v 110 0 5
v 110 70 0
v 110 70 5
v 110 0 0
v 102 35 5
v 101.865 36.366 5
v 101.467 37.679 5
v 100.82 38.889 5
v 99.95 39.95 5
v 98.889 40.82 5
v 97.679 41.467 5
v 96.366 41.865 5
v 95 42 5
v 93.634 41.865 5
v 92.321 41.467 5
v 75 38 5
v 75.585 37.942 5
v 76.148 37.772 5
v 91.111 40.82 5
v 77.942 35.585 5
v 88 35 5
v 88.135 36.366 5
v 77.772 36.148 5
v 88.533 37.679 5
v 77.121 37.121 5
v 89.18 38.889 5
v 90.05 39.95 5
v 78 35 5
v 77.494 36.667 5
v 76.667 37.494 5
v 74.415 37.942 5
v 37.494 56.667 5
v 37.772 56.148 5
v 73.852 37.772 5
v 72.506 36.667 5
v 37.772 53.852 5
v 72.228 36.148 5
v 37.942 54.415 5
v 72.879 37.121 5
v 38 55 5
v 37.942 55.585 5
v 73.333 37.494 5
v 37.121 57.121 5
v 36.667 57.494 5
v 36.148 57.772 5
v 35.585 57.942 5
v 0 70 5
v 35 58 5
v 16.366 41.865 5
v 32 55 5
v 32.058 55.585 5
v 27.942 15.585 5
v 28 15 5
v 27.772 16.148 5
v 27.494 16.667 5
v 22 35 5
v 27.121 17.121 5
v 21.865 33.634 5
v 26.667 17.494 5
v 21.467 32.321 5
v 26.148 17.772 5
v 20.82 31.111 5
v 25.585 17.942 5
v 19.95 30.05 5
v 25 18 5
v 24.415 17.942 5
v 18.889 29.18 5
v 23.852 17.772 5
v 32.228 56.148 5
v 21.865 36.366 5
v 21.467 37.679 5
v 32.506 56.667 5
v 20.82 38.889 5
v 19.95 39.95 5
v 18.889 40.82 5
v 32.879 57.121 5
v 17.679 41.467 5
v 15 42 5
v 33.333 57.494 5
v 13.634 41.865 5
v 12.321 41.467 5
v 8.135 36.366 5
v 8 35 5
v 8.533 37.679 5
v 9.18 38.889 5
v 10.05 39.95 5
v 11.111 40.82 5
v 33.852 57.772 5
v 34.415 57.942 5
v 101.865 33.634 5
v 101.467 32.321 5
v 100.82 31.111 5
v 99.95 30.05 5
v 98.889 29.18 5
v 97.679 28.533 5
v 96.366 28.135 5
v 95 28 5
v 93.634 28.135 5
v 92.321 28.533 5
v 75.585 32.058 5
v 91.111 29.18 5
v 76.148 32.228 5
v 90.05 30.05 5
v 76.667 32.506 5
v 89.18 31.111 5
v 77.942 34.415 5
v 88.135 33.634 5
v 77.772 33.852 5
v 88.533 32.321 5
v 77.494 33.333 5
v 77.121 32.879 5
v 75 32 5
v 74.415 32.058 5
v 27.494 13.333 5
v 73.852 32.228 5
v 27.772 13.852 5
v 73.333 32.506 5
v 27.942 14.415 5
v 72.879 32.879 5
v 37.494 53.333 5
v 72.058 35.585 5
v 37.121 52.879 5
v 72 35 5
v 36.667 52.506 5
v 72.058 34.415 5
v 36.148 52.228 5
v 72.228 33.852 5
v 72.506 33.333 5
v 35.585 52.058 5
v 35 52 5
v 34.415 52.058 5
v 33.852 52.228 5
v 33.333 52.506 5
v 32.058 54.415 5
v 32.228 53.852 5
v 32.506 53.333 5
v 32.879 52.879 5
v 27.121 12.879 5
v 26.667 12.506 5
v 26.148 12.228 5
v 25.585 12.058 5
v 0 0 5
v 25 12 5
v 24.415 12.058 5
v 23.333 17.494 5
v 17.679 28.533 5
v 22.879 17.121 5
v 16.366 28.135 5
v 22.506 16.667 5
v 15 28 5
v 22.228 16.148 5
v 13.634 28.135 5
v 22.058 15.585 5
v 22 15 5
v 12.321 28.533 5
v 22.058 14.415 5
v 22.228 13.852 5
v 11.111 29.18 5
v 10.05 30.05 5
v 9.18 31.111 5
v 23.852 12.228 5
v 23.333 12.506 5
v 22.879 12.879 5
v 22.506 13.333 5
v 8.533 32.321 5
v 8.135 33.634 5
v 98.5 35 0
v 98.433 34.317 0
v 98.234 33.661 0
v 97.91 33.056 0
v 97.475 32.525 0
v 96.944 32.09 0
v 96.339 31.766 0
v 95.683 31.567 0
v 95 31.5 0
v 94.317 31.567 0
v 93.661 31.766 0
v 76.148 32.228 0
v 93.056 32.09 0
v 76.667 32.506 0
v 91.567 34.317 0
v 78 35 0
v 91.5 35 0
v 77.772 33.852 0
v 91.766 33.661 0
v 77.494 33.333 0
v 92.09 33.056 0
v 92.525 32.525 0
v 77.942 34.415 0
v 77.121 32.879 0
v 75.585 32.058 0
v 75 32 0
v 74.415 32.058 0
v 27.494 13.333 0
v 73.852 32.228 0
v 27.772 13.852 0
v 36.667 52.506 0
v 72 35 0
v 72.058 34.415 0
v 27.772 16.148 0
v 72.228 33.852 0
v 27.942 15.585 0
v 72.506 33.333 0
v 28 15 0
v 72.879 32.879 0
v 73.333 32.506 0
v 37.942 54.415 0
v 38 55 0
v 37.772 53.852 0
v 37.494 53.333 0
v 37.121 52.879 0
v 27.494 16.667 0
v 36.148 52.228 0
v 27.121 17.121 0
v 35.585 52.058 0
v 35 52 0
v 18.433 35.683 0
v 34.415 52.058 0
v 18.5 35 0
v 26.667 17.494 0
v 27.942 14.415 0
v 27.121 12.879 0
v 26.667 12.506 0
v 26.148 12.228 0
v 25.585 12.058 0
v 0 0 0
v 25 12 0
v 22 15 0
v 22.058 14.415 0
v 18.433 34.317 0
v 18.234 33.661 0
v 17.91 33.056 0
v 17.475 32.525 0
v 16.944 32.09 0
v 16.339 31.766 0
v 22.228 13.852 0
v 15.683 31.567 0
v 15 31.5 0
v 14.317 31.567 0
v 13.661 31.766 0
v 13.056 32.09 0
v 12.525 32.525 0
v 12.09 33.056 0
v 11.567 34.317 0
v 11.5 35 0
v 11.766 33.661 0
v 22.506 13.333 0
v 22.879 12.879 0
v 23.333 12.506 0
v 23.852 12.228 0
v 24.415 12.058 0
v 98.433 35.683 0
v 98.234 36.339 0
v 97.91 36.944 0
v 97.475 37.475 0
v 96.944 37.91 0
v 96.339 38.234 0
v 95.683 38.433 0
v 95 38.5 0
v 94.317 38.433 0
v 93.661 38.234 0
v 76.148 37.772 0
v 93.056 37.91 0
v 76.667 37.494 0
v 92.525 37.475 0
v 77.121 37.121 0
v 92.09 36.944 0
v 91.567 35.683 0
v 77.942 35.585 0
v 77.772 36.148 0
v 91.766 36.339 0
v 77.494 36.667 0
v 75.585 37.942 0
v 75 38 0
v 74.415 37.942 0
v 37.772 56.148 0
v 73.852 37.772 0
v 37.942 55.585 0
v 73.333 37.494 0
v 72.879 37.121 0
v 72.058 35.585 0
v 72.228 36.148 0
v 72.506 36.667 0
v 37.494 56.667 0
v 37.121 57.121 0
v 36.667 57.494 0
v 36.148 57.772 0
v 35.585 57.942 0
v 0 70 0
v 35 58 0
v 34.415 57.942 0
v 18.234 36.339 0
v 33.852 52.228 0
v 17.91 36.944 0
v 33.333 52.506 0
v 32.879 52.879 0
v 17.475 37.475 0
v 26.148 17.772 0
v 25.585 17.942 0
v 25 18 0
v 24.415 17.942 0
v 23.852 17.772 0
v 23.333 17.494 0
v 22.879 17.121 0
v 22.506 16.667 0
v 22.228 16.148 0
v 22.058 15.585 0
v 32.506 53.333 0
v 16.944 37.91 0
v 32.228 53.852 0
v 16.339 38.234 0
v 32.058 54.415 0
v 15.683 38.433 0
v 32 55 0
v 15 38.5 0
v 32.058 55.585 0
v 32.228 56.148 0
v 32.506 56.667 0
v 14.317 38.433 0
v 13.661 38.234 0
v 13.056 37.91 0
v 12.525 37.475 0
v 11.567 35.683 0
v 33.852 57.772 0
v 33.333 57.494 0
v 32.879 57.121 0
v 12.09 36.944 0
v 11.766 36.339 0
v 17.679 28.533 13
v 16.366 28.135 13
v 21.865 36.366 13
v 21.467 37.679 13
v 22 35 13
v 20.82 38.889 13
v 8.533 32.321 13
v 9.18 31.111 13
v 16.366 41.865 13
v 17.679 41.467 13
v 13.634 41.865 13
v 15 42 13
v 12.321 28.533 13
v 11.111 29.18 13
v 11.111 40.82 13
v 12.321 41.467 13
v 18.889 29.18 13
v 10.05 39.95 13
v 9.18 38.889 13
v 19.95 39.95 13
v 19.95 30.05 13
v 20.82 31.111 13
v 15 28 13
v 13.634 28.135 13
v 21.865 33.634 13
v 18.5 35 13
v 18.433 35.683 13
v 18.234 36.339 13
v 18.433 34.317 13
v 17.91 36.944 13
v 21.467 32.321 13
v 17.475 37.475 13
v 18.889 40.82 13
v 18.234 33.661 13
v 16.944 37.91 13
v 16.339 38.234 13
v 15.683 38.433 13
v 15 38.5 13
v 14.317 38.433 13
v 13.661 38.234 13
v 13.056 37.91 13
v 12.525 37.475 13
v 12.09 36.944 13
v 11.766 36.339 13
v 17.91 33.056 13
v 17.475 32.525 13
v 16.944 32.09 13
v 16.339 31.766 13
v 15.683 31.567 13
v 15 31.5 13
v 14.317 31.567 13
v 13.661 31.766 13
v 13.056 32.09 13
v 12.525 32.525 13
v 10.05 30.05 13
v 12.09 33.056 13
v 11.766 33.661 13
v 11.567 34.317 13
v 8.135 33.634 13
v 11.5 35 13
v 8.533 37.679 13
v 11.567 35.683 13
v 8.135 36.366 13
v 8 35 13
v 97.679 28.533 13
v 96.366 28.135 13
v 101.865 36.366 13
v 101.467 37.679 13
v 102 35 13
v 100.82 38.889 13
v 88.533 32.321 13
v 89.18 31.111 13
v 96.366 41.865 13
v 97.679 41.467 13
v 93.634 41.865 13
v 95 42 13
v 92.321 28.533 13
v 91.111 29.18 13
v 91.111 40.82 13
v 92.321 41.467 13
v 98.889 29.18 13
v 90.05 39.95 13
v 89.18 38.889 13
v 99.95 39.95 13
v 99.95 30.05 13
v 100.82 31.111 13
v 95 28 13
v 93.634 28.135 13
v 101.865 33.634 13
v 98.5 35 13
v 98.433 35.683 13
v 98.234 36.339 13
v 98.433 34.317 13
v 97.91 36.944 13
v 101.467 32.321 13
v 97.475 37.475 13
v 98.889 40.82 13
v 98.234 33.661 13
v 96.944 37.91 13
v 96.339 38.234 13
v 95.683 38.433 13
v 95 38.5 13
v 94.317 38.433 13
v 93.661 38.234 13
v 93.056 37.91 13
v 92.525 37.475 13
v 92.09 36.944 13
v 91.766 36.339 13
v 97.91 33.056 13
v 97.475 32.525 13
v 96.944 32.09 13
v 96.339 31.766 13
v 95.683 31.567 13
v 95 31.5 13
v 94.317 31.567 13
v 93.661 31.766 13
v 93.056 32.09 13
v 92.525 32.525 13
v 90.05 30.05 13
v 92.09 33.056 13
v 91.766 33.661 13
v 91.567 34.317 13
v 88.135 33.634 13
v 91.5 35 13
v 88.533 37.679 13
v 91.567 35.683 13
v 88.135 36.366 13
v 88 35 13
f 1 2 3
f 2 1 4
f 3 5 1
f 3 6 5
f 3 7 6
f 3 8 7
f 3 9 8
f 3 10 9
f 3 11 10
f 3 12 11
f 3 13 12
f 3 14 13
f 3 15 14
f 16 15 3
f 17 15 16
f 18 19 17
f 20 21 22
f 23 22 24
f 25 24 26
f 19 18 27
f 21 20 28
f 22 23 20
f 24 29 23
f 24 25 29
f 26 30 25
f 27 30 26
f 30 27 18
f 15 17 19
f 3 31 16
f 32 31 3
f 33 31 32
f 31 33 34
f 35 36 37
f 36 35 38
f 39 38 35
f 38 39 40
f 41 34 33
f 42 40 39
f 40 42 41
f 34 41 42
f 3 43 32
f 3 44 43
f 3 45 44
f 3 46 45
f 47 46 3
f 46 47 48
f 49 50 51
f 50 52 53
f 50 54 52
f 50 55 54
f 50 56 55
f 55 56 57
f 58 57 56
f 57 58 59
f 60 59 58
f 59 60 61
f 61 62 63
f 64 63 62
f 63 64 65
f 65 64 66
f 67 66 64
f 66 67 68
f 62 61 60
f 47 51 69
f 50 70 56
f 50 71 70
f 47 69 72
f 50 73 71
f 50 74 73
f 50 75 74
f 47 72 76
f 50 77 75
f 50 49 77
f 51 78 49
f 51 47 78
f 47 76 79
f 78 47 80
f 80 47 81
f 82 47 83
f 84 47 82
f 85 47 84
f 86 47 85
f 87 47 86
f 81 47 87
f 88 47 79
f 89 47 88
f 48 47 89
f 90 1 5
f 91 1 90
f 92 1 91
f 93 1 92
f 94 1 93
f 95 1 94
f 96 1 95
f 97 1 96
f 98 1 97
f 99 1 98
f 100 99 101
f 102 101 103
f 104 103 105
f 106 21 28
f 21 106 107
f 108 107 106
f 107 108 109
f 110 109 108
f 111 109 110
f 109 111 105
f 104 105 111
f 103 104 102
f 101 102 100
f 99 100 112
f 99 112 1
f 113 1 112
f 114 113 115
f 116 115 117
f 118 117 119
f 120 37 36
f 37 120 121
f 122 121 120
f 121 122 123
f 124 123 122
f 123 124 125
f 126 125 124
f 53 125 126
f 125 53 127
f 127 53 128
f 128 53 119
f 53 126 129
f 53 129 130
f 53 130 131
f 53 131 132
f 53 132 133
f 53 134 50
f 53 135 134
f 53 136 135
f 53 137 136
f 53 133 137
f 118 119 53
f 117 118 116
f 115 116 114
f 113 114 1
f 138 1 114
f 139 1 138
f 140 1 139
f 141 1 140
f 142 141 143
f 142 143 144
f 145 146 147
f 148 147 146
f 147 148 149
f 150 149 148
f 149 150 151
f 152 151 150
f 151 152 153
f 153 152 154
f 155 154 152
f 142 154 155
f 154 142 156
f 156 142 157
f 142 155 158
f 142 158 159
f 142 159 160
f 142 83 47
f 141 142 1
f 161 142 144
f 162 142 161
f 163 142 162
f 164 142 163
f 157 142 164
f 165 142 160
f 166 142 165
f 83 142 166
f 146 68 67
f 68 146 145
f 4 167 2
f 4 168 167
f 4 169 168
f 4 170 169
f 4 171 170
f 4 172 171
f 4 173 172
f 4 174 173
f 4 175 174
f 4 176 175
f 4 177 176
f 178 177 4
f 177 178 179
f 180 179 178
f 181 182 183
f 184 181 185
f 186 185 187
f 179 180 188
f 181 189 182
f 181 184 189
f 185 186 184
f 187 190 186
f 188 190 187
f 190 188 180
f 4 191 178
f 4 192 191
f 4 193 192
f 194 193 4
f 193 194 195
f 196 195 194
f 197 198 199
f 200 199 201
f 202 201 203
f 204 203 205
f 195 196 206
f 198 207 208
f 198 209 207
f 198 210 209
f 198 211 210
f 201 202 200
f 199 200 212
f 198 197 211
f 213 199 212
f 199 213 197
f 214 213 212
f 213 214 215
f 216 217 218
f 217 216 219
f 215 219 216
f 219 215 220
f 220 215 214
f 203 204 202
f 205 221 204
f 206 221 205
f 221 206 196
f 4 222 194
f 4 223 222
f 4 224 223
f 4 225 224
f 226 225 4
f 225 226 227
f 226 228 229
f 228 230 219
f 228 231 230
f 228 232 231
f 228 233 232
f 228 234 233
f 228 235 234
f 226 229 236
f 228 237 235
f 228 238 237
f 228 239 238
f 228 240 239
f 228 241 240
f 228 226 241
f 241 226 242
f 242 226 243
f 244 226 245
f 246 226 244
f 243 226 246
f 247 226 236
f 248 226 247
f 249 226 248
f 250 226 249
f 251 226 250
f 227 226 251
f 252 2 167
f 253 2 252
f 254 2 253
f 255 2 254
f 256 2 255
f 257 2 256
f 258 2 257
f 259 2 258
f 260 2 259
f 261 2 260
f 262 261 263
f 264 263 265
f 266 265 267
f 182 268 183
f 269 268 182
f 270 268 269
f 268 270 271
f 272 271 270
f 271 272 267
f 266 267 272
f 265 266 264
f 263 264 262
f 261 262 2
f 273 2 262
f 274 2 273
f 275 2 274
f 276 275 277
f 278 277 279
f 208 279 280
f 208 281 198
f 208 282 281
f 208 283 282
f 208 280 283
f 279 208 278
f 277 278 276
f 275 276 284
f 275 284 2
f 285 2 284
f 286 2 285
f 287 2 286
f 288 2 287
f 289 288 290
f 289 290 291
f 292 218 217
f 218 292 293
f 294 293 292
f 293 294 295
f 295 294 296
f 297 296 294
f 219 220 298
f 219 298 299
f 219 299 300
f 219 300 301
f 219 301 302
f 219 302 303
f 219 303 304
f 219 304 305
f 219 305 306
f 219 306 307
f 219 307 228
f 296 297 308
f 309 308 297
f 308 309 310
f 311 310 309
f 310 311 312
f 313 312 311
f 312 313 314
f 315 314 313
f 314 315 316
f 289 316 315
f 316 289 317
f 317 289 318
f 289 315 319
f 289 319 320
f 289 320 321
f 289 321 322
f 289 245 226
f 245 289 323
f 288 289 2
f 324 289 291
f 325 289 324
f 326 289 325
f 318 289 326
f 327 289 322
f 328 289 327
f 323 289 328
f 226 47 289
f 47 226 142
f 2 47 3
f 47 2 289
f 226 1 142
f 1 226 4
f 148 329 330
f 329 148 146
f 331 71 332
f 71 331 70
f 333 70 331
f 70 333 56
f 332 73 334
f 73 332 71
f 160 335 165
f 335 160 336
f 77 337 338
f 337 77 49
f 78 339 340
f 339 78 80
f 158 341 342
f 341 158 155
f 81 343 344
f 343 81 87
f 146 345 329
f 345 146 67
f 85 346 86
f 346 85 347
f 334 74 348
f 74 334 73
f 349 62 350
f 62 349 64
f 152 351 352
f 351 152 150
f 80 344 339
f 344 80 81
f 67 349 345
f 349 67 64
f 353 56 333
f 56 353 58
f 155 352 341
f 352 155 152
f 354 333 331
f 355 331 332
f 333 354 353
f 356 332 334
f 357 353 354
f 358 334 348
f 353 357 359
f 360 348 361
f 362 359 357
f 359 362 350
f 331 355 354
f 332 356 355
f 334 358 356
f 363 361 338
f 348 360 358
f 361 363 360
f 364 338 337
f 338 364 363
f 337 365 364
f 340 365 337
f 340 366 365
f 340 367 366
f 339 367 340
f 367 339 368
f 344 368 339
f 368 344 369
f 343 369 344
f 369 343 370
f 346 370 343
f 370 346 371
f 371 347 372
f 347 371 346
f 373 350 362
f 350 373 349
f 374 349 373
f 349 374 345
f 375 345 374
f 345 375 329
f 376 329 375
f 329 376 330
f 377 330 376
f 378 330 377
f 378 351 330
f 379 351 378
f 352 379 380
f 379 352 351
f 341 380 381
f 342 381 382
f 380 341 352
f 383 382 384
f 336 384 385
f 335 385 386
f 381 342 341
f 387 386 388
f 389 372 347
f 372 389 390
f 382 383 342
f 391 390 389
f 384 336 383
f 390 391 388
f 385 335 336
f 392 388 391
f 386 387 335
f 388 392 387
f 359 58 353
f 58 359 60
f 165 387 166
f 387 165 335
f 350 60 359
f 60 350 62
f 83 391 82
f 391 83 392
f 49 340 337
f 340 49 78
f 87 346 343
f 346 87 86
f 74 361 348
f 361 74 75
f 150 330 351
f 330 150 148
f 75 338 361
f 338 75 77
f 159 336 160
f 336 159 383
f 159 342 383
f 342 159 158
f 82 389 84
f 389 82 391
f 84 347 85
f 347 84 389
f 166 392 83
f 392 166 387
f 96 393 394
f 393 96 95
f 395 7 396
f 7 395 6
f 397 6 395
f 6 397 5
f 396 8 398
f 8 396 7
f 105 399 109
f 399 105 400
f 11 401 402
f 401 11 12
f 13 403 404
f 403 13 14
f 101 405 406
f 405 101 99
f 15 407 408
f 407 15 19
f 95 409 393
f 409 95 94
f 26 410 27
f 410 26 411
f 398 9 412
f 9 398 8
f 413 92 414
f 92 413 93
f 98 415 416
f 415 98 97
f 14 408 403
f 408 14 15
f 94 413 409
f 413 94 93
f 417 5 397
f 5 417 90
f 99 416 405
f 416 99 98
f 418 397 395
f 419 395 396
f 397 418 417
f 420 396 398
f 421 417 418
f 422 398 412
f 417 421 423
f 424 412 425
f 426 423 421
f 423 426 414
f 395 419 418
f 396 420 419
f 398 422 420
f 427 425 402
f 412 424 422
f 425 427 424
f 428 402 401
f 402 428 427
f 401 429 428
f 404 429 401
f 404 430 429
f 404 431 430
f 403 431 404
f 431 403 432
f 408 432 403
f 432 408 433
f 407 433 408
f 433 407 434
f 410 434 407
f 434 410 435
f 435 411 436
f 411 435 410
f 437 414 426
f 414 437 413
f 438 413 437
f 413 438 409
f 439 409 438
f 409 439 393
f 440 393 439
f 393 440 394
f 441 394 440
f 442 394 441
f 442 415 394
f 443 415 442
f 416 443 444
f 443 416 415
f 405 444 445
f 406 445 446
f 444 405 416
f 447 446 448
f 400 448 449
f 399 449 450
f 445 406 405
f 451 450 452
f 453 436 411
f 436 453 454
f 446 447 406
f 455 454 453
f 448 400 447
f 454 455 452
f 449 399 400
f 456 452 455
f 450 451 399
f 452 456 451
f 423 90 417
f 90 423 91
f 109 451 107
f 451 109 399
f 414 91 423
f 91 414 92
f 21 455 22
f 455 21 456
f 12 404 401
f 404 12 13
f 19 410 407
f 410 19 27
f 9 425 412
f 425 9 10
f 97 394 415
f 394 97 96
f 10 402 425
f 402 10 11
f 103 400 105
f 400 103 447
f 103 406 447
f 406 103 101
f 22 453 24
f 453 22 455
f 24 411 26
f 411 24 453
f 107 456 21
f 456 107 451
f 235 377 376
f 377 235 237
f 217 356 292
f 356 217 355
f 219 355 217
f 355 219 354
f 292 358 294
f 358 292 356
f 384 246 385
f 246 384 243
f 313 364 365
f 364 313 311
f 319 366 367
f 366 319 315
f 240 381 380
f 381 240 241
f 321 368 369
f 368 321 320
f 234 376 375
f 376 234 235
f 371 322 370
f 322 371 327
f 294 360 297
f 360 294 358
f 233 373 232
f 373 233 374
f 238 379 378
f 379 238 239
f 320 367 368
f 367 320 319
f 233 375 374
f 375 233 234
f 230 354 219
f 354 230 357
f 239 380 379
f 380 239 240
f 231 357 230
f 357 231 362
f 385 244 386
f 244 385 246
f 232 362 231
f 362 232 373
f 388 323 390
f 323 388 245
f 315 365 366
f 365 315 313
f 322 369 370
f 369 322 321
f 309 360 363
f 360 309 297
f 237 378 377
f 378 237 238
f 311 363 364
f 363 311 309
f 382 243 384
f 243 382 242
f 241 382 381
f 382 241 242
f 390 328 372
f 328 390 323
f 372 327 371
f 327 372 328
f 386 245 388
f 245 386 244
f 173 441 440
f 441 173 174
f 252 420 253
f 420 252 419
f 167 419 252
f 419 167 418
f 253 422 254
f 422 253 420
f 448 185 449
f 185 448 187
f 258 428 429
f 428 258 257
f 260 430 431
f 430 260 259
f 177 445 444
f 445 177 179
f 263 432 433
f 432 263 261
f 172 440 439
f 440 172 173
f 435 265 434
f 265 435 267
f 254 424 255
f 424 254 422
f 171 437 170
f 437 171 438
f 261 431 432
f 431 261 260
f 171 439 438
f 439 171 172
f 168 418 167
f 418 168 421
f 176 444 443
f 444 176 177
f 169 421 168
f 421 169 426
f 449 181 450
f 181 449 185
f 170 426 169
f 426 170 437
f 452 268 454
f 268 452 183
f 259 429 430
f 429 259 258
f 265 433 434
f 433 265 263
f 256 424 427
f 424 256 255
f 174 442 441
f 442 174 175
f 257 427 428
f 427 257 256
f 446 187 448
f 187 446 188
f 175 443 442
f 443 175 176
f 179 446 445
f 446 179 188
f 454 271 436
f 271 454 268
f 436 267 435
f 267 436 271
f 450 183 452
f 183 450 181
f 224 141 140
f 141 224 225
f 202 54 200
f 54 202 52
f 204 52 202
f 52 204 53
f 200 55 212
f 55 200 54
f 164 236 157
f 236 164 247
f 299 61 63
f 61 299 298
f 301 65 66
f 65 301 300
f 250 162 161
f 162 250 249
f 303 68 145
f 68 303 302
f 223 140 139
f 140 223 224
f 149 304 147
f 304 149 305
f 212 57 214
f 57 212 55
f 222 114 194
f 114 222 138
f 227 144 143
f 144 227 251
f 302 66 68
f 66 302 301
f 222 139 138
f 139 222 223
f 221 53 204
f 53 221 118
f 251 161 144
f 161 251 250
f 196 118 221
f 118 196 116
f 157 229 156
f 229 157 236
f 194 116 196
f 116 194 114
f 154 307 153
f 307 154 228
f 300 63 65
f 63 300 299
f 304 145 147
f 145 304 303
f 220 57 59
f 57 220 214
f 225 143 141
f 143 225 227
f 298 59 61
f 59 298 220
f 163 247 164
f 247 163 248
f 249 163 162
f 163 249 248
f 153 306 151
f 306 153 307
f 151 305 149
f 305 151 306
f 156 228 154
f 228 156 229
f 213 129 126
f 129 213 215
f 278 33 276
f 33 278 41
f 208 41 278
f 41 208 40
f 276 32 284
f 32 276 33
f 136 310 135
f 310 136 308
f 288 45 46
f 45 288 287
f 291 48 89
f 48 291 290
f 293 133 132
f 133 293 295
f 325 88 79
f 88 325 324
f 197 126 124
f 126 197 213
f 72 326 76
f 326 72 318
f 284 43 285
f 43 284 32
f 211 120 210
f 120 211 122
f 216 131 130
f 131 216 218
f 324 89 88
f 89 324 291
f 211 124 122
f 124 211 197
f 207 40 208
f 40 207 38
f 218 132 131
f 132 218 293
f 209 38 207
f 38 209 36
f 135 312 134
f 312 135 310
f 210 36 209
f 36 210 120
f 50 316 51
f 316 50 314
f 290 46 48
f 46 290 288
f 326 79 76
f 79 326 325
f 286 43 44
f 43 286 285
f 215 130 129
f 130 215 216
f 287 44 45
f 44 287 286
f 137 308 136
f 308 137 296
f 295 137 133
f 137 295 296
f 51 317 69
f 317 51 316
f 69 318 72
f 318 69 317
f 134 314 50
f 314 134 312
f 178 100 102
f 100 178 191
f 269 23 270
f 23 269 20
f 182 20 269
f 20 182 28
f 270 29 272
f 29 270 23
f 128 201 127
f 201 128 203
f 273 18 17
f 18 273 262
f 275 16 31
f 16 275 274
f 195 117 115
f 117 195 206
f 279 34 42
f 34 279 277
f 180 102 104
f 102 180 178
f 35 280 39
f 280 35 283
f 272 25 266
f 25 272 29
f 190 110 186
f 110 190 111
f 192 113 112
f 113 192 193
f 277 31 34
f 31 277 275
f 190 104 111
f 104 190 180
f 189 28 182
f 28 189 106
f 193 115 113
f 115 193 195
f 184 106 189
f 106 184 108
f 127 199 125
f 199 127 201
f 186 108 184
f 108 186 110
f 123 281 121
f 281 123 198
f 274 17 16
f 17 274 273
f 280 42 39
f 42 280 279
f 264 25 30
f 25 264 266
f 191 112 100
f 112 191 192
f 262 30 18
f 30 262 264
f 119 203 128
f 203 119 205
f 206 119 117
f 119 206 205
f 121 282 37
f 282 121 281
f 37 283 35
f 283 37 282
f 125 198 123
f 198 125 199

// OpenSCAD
$fn = 32;

// ----------------------------------------------------------------------
// Mixed field: bosses and holes at given coordinates
// ----------------------------------------------------------------------

// --- parameters (mm) ---
plate_l = 110;            // plate length, X
plate_w = 70;             // plate width, Y
plate_t = 5;              // plate thickness, Z
boss_d = 14;              // boss diameter
boss_h = 8;               // boss height above the plate
hole_d = 6;               // through hole diameter
fit_tol = 0.05;           // tolerance for press fits, mm
free_tol = 0.3;           // tolerance for clearance fits, mm

total_h = plate_t + boss_h;  // overall height

difference() {
  union() {
    cube([plate_l, plate_w, plate_t]);
    translate([15, 35, plate_t]) cylinder(h = boss_h, d = boss_d);
    translate([95, 35, plate_t]) cylinder(h = boss_h, d = boss_d);
  }
  translate([15, 35, -1]) cylinder(h = total_h + 2, d = boss_d / 2);
  translate([95, 35, -1]) cylinder(h = total_h + 2, d = boss_d / 2);
  translate([25, 15, -1]) cylinder(h = plate_t + 2, d = hole_d);
  translate([35, 55, -1]) cylinder(h = plate_t + 2, d = hole_d);
  translate([75, 35, -1]) cylinder(h = plate_t + 2, d = hole_d);
}
